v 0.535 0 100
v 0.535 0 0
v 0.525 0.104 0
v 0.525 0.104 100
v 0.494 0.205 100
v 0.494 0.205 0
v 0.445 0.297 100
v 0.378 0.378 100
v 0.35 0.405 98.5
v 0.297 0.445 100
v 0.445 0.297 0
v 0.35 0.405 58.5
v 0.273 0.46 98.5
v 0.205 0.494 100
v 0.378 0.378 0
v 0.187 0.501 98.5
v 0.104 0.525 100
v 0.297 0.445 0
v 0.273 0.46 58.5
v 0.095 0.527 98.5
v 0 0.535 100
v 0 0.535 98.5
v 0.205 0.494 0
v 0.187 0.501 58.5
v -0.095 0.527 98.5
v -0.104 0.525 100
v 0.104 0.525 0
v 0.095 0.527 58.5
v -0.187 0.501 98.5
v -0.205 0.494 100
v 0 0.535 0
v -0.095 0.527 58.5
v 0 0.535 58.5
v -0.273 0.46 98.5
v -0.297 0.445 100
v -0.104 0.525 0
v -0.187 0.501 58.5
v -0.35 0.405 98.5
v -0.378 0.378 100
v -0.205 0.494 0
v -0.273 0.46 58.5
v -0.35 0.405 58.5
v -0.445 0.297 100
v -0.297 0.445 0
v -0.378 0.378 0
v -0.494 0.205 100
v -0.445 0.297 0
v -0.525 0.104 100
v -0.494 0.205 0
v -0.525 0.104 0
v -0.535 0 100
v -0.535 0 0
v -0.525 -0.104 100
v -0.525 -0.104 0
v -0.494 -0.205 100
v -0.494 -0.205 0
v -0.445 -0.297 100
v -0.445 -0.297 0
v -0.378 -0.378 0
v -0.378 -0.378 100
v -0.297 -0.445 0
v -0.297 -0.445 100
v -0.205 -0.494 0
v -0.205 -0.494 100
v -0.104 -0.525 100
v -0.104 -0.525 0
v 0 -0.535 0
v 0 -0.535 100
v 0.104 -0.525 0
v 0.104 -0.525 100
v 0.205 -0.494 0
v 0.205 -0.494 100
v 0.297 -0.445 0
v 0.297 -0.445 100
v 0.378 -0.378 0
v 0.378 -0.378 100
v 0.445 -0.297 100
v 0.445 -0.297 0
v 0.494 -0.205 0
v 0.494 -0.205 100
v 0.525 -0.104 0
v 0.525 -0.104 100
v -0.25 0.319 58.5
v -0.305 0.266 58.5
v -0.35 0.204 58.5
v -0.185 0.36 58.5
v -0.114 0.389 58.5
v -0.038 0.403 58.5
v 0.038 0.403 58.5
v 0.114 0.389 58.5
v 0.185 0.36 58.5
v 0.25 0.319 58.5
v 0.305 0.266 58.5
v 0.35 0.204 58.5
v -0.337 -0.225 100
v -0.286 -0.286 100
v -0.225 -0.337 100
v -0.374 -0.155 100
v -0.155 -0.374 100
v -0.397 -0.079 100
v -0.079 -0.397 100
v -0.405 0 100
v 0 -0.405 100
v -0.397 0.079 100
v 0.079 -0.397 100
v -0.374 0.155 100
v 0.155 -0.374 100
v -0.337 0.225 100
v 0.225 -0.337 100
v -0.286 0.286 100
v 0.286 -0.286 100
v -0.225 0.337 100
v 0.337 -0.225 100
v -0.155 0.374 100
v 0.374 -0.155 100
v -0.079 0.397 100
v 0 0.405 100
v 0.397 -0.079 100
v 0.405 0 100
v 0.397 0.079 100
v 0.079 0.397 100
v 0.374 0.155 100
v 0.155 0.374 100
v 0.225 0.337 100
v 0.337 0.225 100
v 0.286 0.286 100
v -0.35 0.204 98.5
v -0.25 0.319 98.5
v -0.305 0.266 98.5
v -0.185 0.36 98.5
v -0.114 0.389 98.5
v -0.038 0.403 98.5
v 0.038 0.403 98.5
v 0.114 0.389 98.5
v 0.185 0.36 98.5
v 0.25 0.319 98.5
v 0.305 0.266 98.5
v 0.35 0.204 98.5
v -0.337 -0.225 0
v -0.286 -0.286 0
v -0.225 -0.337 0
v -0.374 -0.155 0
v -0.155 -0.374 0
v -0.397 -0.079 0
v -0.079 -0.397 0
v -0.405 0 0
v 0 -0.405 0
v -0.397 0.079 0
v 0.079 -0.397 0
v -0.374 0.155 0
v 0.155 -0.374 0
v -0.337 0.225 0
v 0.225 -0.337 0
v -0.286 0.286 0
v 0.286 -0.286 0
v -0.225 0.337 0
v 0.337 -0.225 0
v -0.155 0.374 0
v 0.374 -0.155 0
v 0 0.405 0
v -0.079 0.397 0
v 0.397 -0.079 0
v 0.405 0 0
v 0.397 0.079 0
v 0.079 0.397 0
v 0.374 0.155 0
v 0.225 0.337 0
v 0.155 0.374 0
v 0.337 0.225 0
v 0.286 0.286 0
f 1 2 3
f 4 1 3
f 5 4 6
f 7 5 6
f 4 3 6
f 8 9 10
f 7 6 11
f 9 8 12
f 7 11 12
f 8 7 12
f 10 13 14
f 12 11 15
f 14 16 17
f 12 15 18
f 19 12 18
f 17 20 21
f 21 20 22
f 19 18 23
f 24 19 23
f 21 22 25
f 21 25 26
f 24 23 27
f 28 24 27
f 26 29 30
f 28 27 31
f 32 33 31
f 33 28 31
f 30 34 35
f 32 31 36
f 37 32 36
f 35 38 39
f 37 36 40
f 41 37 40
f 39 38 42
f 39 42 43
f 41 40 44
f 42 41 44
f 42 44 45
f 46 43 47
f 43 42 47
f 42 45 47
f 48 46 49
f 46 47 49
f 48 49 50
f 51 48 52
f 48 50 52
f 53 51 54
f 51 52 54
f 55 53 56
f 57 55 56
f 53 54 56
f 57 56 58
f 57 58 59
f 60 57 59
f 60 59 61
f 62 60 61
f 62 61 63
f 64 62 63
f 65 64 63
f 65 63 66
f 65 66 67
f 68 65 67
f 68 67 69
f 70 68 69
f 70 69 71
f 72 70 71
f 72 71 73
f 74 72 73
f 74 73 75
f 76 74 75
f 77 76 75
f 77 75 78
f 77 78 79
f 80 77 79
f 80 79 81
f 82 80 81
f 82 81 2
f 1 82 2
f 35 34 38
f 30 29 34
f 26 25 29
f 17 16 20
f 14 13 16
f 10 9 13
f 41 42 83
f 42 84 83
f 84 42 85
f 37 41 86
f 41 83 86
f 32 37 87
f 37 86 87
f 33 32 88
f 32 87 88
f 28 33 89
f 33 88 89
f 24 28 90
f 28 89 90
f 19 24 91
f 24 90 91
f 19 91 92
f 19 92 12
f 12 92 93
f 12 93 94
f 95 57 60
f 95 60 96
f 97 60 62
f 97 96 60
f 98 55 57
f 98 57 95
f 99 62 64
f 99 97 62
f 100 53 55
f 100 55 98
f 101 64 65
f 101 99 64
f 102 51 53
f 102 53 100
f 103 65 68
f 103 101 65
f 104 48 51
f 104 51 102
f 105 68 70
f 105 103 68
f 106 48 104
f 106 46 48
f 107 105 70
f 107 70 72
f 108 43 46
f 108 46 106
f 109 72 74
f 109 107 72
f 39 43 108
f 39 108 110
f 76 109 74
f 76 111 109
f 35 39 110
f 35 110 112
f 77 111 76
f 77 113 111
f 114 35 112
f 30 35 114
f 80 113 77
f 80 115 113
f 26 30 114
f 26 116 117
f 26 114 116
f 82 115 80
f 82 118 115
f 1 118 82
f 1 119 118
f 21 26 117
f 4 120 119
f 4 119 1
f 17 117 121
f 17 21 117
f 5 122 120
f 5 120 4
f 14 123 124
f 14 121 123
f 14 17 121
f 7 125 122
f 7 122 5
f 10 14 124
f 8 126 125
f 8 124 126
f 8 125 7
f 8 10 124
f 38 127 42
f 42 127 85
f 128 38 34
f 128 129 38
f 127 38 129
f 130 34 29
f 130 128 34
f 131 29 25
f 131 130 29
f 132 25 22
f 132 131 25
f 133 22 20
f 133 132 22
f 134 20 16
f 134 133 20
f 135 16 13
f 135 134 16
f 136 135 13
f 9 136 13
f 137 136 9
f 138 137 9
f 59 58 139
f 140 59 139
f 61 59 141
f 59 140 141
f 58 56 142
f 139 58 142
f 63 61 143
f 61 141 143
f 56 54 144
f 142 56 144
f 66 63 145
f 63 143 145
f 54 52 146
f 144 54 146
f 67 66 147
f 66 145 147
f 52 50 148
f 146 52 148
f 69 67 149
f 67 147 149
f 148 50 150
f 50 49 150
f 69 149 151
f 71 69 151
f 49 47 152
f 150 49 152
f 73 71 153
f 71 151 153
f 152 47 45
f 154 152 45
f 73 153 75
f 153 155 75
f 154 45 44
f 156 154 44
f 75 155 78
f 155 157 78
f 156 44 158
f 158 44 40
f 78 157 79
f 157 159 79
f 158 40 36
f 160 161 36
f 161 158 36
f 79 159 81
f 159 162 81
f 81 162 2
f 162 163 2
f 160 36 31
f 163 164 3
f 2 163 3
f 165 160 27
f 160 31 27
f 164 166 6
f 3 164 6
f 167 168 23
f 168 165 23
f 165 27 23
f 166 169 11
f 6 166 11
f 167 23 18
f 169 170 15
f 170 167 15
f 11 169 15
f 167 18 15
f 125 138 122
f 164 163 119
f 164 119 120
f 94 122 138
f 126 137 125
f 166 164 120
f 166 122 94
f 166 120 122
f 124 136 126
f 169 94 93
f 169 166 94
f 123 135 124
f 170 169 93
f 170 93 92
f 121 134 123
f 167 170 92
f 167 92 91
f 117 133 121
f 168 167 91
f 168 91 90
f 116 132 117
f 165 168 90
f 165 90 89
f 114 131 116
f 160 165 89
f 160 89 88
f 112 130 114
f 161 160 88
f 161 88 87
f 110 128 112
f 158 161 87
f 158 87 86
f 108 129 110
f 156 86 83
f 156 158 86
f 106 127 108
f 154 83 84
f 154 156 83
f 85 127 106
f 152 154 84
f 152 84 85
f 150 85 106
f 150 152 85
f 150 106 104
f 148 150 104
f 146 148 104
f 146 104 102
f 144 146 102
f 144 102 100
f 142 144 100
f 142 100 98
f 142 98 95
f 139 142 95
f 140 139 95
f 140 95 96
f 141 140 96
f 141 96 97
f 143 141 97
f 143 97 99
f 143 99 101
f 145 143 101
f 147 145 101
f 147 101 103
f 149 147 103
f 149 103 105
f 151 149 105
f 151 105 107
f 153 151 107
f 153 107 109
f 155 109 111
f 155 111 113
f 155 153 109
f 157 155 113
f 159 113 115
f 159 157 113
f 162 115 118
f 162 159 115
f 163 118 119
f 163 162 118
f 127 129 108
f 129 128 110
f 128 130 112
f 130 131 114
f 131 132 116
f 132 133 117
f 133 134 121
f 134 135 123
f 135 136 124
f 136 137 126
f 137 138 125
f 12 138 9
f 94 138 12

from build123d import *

# Parameters (mm, degrees)
SKETCH1_R           = 0.535
SKETCH1_R_2         = 0.405
BOSS_EXTRUDE1_DEPTH = 100
SKETCH2_W           = 0.7
SKETCH2_H           = 40
CUT_EXTRUDE1_DEPTH  = 1.535


with BuildPart() as part:
    # Sketch1 → Boss-Extrude1 (new body)
    with BuildSketch(Plane.XY):
        Circle(SKETCH1_R)
        Circle(SKETCH1_R_2, mode=Mode.SUBTRACT)
    extrude(amount=BOSS_EXTRUDE1_DEPTH)

    # Sketch2 → Cut-Extrude1 (cut, through all)
    with BuildSketch(Plane(origin=(0, 0, 0), x_dir=(1, 0, 0), z_dir=(0, 1, 0))):
        with Locations((0, -78.5)):
            Rectangle(SKETCH2_W, SKETCH2_H)
    extrude(amount=CUT_EXTRUDE1_DEPTH, mode=Mode.SUBTRACT)


solid = part.part
